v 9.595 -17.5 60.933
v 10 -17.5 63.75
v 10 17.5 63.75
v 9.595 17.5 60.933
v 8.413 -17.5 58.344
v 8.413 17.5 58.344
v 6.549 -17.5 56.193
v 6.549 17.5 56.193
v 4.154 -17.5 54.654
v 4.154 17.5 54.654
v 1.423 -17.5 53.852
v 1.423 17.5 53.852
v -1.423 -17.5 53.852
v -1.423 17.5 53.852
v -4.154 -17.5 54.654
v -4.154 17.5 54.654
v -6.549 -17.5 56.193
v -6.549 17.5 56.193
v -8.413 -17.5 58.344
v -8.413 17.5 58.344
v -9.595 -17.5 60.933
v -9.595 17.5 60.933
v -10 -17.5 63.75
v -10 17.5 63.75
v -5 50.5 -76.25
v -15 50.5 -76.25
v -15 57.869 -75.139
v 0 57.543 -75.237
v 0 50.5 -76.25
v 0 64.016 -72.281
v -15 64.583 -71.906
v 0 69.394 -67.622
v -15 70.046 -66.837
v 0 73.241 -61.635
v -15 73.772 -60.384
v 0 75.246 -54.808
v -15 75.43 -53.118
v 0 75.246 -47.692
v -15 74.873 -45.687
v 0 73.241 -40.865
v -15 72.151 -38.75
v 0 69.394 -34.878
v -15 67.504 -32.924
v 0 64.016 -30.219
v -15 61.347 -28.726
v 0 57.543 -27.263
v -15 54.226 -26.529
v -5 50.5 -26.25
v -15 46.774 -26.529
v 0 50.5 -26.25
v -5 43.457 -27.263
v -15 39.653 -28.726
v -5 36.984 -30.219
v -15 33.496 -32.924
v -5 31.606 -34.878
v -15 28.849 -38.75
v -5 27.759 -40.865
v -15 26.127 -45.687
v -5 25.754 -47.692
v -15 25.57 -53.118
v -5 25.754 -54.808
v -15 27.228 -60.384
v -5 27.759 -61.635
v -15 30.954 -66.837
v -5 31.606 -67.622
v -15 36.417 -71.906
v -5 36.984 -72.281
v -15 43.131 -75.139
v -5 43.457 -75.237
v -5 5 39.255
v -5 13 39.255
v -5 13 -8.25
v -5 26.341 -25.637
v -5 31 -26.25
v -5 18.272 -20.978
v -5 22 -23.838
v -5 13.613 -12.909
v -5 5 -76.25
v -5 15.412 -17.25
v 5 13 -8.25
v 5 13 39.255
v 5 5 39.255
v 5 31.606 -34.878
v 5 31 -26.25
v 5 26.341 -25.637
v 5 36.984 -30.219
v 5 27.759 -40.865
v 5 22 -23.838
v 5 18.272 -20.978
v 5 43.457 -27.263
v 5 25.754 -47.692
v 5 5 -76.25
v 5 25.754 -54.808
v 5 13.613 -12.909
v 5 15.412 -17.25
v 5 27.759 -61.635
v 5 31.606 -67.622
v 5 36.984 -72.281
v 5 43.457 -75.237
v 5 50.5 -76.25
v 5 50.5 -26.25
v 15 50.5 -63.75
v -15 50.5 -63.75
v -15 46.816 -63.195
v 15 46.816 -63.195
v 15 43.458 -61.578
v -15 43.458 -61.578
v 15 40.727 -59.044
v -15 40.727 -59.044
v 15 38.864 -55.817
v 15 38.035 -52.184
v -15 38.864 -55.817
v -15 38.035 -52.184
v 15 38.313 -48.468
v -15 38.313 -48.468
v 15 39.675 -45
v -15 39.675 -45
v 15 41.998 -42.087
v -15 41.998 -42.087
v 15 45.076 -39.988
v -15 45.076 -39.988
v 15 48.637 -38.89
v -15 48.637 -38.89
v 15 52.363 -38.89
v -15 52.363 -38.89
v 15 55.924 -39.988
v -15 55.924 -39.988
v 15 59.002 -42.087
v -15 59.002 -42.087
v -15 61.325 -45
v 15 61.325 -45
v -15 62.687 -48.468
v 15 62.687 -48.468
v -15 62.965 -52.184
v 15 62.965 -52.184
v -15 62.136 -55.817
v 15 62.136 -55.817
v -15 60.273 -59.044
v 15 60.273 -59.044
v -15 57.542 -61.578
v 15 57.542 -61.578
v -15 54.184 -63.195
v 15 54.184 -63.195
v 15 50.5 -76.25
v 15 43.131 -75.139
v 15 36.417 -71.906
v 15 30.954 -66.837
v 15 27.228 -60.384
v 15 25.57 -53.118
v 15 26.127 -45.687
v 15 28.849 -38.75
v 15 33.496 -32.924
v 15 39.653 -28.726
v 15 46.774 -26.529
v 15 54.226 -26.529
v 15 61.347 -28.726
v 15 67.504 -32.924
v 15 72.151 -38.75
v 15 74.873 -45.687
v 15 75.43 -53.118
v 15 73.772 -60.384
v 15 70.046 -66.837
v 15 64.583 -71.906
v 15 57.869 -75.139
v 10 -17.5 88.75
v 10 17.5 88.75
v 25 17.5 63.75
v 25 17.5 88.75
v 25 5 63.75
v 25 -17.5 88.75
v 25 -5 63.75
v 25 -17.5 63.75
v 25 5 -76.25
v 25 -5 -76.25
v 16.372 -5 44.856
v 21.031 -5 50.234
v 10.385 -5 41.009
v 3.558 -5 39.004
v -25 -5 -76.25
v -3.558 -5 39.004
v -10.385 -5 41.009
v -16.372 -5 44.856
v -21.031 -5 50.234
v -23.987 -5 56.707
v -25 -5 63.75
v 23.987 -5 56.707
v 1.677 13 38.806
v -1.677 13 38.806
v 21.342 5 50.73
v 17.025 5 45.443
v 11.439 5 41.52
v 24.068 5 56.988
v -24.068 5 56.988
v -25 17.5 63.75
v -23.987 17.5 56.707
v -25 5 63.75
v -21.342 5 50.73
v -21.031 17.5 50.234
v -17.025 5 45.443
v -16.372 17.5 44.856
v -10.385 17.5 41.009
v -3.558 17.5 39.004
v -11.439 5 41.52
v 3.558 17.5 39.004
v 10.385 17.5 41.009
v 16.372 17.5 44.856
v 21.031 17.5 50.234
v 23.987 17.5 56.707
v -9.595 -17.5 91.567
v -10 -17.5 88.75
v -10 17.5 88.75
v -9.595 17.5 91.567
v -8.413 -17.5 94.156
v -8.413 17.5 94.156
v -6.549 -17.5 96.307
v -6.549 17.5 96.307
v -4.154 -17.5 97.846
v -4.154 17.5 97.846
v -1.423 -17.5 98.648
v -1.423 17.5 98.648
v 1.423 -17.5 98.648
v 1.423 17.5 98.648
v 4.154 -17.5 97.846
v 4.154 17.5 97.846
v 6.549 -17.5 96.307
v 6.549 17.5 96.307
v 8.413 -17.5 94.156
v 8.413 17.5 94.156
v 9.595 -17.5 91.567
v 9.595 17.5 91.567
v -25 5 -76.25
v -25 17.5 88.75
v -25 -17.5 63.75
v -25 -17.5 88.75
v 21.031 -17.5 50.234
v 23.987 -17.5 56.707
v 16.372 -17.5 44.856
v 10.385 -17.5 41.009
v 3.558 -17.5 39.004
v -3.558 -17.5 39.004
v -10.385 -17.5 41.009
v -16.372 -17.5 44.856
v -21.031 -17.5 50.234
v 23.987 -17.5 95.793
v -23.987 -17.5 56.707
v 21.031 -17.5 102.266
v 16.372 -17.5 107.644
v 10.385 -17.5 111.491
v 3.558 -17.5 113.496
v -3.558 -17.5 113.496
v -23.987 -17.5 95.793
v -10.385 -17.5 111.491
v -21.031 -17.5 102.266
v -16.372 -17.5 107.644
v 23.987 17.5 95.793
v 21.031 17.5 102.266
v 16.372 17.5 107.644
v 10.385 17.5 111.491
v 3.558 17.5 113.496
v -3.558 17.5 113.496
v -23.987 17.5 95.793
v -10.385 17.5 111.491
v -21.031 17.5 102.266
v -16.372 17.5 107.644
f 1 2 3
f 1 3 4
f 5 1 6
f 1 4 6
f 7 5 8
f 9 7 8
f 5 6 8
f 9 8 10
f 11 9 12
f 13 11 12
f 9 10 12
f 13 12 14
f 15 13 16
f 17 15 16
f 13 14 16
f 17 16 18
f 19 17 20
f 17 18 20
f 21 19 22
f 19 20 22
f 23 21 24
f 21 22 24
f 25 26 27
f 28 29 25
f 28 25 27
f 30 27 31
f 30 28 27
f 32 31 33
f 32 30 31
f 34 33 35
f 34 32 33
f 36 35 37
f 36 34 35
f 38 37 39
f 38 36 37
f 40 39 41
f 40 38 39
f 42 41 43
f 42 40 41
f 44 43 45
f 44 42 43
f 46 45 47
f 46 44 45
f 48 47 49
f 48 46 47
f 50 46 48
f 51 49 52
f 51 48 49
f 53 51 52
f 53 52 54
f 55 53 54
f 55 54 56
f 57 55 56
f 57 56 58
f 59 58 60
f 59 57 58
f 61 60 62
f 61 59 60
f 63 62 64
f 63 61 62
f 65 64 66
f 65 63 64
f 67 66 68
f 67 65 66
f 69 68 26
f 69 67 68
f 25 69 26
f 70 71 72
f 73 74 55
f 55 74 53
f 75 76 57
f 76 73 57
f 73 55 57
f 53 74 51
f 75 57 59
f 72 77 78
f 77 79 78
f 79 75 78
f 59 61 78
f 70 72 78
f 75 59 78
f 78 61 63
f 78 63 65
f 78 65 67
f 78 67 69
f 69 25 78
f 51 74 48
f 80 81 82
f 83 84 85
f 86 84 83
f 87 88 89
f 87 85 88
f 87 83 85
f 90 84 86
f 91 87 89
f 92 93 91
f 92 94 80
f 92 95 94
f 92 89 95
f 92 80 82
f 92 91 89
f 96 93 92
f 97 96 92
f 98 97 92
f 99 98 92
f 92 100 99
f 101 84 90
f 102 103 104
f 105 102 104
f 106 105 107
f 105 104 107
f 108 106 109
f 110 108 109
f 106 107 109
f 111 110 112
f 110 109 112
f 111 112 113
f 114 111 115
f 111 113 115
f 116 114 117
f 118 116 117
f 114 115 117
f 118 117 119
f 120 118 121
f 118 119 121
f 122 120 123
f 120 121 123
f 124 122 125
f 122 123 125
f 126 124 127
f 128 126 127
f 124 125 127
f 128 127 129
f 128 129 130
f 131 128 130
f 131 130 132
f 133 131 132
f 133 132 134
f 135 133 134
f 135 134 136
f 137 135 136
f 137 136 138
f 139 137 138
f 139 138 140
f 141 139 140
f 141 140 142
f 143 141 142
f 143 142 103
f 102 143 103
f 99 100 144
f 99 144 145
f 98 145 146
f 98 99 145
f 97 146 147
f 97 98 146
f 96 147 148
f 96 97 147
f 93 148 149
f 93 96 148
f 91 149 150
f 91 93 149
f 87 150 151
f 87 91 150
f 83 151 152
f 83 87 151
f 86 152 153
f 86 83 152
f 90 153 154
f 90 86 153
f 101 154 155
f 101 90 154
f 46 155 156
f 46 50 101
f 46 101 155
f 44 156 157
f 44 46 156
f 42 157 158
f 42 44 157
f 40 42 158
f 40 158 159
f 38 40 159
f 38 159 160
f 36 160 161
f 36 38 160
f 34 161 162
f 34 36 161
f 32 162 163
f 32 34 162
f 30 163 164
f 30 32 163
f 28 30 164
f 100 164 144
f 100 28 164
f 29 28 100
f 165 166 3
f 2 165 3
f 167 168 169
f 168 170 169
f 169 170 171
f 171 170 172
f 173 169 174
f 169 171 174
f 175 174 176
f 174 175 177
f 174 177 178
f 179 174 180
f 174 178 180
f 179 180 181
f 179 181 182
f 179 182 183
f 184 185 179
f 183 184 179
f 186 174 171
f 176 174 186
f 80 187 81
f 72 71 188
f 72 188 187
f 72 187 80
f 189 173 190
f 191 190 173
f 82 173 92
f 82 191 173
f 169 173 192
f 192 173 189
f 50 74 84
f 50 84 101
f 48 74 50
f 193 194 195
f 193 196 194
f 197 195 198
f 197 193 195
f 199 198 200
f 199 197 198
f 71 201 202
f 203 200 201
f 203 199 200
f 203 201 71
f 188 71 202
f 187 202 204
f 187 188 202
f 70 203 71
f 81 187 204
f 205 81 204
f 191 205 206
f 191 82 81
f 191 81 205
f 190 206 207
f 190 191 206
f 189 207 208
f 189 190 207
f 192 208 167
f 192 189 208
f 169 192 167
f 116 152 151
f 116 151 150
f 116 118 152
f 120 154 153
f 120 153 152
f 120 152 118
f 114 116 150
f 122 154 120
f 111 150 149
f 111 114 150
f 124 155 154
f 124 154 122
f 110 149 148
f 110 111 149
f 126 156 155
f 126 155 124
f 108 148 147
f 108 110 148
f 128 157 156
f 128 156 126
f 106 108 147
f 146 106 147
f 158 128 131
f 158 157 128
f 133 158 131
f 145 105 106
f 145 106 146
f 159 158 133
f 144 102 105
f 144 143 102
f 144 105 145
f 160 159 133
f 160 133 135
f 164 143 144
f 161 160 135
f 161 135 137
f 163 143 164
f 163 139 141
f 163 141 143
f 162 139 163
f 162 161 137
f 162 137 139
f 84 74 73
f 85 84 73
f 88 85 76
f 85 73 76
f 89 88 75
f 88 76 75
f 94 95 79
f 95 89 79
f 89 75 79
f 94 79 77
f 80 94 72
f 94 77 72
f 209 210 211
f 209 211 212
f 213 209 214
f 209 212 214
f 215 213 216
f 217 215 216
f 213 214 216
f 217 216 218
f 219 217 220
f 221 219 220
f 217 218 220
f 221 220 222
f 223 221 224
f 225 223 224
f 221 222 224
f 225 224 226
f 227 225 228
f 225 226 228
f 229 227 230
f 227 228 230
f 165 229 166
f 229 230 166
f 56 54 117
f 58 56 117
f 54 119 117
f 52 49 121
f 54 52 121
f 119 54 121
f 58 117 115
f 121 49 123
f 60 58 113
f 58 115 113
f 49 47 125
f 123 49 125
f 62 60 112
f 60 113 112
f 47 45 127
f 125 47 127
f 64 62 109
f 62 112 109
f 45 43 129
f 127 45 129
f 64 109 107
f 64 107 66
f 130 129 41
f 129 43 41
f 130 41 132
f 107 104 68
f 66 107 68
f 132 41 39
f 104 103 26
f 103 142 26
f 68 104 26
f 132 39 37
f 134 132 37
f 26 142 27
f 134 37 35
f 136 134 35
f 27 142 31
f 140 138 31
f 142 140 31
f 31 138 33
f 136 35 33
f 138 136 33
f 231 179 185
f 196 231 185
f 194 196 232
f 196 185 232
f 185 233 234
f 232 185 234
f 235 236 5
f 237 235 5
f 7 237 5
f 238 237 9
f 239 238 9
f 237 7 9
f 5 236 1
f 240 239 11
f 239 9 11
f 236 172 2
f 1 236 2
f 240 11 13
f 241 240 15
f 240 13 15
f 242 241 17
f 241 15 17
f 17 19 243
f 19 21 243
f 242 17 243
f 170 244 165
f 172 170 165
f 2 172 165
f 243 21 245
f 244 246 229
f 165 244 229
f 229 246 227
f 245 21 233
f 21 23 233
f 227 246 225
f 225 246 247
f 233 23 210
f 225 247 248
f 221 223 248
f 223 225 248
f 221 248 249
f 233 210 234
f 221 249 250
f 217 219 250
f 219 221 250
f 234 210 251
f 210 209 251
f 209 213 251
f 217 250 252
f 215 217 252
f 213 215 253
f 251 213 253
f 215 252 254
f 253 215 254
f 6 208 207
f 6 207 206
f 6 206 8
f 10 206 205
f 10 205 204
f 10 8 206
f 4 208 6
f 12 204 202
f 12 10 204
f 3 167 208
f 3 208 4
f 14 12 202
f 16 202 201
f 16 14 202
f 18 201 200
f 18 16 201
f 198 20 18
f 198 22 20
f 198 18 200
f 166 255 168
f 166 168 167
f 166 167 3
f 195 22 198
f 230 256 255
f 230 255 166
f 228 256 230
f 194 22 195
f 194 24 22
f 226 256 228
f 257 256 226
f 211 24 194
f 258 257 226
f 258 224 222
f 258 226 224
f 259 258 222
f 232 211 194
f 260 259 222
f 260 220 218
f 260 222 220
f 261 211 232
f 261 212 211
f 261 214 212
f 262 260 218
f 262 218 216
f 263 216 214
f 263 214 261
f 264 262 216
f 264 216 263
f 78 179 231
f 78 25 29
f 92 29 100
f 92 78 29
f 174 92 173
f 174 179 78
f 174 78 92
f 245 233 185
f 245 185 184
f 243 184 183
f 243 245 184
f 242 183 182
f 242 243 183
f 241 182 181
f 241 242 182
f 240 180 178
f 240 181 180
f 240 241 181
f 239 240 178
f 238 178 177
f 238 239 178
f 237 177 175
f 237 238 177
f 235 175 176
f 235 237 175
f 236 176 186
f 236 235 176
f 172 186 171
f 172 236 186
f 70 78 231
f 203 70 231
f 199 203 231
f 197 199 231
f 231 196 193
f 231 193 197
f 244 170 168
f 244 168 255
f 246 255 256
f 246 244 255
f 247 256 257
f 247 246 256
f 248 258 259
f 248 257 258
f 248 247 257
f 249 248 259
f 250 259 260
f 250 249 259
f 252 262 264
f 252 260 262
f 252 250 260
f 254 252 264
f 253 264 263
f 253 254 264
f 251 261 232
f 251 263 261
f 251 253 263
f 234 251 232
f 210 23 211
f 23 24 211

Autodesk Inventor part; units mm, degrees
ref_plane "YZ Plane" through (0, 0, 0) normal (1, 0, 0) x (0, 1, 0)
ref_plane "XZ Plane" through (0, 0, 0) normal (0, 1, 0) x (-1, 0, 0)
sketch "Esboço1" plane through (0, 0, 0) normal (0, 1, 0) x (-1, 0, 0)
  line L0 (-25, 76.25) -> (25, 76.25)
  line L1 (25, 76.25) -> (25, -76.25)
  line L2 (25, -76.25) -> (-25, -76.25)
  line L3 (-25, -76.25) -> (-25, 76.25)
  line L4 (-25, 76.25) -> (25, -76.25) construction
  line L5 (25, 76.25) -> (-25, -76.25) construction
  line L6 (0, 88.75) -> (0, 63.75) construction
  line L7 (-25, 88.75) -> (-25, 63.75)
  line L8 (25, 63.75) -> (25, 88.75)
  arc A0 (25, 88.75) -> (-25, 88.75) centre (0, 88.75) ccw
  arc A1 (-25, 63.75) -> (25, 63.75) centre (0, 63.75) ccw
  point P0 (0, 0)
  point P1 (0, 76.25)
  point P2 (0, 113.75)
  dimension "d1" = 25
  dimension "d2" = 50
  dimension "d3" = 190
extrude "Extrusão1" add sketch "Esboço1" along normal mid plane 35 contours L7 A0 L8 L0 | L0 L1 A1 L3
extrude "Extrusão2" add sketch "Esboço1" along normal mid plane 10 contours A1 L1 L2 L3
ref_plane "Plano de trabalho1" through (0, -17.5, 88.75) normal (1, 0, 0) x (0, 0, -1)
sketch "Esboço3" plane through (0, -17.5, 88.75) normal (1, 0, 0) x (0, 0, -1)
  circle A0 centre (140, 68) radius 25
  line L0 (165, 12.5) -> (165, 22.5) projected
  line L1 (165, 12.5) -> (25, 12.5) projected
  point P0 (88.75, 17.5)
  dimension "d8" = 50
  dimension "d9" = 55.5
extrude "Extrusão3" add sketch "Esboço3" along normal mid plane 30
sketch "Esboço5" plane through (0, -17.5, 88.75) normal (1, 0, 0) x (0, 0, -1)
  circle A0 centre (140, 68) radius 25 projected
  line L0 (165, 68) -> (165, 22.5)
  line L1 (165, 22.5) -> (11.9907, 22.5)
  line L2 (11.9907, 22.5) -> (11.9907, 30.5)
  line L3 (11.9907, 22.5) -> (165, 22.5)
  line L4 (115, 68) -> (165, 68)
  line L5 (11.9907, 30.5) -> (97, 30.5)
  line L6 (115, 48.5) -> (115, 68)
  line L7 (165, 22.5) -> (25, 22.5) projected
  arc A1 (97, 30.5) -> (115, 48.5) centre (97, 48.5) ccw
  line L8 (165, 22.5) -> (165, 12.5) projected
  point P0 (88.75, 17.5)
  dimension "d14" = 8
  dimension "d15" = 18
extrude "Extrusão4" add sketch "Esboço5" along normal mid plane 10 contours L0 L1 L2 L5 A1 L6 A0
sketch "Esboço6" plane through (15, 50.5, -51.25) normal (1, 0, 0) x (0, 0, -1)
  circle A0 centre (0, 0) radius 25 projected
  point P0 (-51.25, -50.5)
hole "Furo1" at (15, 50.5, -51.25) direction (-1, 0, 0) diameter 25 end through all
sketch "Esboço7" plane through (0, 17.5, 0) normal (0, 1, 0) x (1, 0, 0)
  line L0 (25, -88.75) -> (25, -63.75) projected
  arc A0 (25, -63.75) -> (-25, -63.75) centre (0, -63.75) ccw projected
  line L1 (-25, -63.75) -> (-25, -88.75) projected
  arc A1 (-25, -88.75) -> (25, -88.75) centre (0, -88.75) ccw projected
  line L2 (10, -88.75) -> (10, -63.75)
  arc A2 (10, -63.75) -> (-10, -63.75) centre (0, -63.75) ccw
  line L3 (-10, -63.75) -> (-10, -88.75)
  arc A3 (-10, -88.75) -> (10, -88.75) centre (0, -88.75) ccw
  point P0 (0, 0)
  dimension "d25" = 20
extrude "Extrusão5" cut sketch "Esboço7" against normal through all contours A3 L3 A2 L2
properties part number "Peça teste 6"
